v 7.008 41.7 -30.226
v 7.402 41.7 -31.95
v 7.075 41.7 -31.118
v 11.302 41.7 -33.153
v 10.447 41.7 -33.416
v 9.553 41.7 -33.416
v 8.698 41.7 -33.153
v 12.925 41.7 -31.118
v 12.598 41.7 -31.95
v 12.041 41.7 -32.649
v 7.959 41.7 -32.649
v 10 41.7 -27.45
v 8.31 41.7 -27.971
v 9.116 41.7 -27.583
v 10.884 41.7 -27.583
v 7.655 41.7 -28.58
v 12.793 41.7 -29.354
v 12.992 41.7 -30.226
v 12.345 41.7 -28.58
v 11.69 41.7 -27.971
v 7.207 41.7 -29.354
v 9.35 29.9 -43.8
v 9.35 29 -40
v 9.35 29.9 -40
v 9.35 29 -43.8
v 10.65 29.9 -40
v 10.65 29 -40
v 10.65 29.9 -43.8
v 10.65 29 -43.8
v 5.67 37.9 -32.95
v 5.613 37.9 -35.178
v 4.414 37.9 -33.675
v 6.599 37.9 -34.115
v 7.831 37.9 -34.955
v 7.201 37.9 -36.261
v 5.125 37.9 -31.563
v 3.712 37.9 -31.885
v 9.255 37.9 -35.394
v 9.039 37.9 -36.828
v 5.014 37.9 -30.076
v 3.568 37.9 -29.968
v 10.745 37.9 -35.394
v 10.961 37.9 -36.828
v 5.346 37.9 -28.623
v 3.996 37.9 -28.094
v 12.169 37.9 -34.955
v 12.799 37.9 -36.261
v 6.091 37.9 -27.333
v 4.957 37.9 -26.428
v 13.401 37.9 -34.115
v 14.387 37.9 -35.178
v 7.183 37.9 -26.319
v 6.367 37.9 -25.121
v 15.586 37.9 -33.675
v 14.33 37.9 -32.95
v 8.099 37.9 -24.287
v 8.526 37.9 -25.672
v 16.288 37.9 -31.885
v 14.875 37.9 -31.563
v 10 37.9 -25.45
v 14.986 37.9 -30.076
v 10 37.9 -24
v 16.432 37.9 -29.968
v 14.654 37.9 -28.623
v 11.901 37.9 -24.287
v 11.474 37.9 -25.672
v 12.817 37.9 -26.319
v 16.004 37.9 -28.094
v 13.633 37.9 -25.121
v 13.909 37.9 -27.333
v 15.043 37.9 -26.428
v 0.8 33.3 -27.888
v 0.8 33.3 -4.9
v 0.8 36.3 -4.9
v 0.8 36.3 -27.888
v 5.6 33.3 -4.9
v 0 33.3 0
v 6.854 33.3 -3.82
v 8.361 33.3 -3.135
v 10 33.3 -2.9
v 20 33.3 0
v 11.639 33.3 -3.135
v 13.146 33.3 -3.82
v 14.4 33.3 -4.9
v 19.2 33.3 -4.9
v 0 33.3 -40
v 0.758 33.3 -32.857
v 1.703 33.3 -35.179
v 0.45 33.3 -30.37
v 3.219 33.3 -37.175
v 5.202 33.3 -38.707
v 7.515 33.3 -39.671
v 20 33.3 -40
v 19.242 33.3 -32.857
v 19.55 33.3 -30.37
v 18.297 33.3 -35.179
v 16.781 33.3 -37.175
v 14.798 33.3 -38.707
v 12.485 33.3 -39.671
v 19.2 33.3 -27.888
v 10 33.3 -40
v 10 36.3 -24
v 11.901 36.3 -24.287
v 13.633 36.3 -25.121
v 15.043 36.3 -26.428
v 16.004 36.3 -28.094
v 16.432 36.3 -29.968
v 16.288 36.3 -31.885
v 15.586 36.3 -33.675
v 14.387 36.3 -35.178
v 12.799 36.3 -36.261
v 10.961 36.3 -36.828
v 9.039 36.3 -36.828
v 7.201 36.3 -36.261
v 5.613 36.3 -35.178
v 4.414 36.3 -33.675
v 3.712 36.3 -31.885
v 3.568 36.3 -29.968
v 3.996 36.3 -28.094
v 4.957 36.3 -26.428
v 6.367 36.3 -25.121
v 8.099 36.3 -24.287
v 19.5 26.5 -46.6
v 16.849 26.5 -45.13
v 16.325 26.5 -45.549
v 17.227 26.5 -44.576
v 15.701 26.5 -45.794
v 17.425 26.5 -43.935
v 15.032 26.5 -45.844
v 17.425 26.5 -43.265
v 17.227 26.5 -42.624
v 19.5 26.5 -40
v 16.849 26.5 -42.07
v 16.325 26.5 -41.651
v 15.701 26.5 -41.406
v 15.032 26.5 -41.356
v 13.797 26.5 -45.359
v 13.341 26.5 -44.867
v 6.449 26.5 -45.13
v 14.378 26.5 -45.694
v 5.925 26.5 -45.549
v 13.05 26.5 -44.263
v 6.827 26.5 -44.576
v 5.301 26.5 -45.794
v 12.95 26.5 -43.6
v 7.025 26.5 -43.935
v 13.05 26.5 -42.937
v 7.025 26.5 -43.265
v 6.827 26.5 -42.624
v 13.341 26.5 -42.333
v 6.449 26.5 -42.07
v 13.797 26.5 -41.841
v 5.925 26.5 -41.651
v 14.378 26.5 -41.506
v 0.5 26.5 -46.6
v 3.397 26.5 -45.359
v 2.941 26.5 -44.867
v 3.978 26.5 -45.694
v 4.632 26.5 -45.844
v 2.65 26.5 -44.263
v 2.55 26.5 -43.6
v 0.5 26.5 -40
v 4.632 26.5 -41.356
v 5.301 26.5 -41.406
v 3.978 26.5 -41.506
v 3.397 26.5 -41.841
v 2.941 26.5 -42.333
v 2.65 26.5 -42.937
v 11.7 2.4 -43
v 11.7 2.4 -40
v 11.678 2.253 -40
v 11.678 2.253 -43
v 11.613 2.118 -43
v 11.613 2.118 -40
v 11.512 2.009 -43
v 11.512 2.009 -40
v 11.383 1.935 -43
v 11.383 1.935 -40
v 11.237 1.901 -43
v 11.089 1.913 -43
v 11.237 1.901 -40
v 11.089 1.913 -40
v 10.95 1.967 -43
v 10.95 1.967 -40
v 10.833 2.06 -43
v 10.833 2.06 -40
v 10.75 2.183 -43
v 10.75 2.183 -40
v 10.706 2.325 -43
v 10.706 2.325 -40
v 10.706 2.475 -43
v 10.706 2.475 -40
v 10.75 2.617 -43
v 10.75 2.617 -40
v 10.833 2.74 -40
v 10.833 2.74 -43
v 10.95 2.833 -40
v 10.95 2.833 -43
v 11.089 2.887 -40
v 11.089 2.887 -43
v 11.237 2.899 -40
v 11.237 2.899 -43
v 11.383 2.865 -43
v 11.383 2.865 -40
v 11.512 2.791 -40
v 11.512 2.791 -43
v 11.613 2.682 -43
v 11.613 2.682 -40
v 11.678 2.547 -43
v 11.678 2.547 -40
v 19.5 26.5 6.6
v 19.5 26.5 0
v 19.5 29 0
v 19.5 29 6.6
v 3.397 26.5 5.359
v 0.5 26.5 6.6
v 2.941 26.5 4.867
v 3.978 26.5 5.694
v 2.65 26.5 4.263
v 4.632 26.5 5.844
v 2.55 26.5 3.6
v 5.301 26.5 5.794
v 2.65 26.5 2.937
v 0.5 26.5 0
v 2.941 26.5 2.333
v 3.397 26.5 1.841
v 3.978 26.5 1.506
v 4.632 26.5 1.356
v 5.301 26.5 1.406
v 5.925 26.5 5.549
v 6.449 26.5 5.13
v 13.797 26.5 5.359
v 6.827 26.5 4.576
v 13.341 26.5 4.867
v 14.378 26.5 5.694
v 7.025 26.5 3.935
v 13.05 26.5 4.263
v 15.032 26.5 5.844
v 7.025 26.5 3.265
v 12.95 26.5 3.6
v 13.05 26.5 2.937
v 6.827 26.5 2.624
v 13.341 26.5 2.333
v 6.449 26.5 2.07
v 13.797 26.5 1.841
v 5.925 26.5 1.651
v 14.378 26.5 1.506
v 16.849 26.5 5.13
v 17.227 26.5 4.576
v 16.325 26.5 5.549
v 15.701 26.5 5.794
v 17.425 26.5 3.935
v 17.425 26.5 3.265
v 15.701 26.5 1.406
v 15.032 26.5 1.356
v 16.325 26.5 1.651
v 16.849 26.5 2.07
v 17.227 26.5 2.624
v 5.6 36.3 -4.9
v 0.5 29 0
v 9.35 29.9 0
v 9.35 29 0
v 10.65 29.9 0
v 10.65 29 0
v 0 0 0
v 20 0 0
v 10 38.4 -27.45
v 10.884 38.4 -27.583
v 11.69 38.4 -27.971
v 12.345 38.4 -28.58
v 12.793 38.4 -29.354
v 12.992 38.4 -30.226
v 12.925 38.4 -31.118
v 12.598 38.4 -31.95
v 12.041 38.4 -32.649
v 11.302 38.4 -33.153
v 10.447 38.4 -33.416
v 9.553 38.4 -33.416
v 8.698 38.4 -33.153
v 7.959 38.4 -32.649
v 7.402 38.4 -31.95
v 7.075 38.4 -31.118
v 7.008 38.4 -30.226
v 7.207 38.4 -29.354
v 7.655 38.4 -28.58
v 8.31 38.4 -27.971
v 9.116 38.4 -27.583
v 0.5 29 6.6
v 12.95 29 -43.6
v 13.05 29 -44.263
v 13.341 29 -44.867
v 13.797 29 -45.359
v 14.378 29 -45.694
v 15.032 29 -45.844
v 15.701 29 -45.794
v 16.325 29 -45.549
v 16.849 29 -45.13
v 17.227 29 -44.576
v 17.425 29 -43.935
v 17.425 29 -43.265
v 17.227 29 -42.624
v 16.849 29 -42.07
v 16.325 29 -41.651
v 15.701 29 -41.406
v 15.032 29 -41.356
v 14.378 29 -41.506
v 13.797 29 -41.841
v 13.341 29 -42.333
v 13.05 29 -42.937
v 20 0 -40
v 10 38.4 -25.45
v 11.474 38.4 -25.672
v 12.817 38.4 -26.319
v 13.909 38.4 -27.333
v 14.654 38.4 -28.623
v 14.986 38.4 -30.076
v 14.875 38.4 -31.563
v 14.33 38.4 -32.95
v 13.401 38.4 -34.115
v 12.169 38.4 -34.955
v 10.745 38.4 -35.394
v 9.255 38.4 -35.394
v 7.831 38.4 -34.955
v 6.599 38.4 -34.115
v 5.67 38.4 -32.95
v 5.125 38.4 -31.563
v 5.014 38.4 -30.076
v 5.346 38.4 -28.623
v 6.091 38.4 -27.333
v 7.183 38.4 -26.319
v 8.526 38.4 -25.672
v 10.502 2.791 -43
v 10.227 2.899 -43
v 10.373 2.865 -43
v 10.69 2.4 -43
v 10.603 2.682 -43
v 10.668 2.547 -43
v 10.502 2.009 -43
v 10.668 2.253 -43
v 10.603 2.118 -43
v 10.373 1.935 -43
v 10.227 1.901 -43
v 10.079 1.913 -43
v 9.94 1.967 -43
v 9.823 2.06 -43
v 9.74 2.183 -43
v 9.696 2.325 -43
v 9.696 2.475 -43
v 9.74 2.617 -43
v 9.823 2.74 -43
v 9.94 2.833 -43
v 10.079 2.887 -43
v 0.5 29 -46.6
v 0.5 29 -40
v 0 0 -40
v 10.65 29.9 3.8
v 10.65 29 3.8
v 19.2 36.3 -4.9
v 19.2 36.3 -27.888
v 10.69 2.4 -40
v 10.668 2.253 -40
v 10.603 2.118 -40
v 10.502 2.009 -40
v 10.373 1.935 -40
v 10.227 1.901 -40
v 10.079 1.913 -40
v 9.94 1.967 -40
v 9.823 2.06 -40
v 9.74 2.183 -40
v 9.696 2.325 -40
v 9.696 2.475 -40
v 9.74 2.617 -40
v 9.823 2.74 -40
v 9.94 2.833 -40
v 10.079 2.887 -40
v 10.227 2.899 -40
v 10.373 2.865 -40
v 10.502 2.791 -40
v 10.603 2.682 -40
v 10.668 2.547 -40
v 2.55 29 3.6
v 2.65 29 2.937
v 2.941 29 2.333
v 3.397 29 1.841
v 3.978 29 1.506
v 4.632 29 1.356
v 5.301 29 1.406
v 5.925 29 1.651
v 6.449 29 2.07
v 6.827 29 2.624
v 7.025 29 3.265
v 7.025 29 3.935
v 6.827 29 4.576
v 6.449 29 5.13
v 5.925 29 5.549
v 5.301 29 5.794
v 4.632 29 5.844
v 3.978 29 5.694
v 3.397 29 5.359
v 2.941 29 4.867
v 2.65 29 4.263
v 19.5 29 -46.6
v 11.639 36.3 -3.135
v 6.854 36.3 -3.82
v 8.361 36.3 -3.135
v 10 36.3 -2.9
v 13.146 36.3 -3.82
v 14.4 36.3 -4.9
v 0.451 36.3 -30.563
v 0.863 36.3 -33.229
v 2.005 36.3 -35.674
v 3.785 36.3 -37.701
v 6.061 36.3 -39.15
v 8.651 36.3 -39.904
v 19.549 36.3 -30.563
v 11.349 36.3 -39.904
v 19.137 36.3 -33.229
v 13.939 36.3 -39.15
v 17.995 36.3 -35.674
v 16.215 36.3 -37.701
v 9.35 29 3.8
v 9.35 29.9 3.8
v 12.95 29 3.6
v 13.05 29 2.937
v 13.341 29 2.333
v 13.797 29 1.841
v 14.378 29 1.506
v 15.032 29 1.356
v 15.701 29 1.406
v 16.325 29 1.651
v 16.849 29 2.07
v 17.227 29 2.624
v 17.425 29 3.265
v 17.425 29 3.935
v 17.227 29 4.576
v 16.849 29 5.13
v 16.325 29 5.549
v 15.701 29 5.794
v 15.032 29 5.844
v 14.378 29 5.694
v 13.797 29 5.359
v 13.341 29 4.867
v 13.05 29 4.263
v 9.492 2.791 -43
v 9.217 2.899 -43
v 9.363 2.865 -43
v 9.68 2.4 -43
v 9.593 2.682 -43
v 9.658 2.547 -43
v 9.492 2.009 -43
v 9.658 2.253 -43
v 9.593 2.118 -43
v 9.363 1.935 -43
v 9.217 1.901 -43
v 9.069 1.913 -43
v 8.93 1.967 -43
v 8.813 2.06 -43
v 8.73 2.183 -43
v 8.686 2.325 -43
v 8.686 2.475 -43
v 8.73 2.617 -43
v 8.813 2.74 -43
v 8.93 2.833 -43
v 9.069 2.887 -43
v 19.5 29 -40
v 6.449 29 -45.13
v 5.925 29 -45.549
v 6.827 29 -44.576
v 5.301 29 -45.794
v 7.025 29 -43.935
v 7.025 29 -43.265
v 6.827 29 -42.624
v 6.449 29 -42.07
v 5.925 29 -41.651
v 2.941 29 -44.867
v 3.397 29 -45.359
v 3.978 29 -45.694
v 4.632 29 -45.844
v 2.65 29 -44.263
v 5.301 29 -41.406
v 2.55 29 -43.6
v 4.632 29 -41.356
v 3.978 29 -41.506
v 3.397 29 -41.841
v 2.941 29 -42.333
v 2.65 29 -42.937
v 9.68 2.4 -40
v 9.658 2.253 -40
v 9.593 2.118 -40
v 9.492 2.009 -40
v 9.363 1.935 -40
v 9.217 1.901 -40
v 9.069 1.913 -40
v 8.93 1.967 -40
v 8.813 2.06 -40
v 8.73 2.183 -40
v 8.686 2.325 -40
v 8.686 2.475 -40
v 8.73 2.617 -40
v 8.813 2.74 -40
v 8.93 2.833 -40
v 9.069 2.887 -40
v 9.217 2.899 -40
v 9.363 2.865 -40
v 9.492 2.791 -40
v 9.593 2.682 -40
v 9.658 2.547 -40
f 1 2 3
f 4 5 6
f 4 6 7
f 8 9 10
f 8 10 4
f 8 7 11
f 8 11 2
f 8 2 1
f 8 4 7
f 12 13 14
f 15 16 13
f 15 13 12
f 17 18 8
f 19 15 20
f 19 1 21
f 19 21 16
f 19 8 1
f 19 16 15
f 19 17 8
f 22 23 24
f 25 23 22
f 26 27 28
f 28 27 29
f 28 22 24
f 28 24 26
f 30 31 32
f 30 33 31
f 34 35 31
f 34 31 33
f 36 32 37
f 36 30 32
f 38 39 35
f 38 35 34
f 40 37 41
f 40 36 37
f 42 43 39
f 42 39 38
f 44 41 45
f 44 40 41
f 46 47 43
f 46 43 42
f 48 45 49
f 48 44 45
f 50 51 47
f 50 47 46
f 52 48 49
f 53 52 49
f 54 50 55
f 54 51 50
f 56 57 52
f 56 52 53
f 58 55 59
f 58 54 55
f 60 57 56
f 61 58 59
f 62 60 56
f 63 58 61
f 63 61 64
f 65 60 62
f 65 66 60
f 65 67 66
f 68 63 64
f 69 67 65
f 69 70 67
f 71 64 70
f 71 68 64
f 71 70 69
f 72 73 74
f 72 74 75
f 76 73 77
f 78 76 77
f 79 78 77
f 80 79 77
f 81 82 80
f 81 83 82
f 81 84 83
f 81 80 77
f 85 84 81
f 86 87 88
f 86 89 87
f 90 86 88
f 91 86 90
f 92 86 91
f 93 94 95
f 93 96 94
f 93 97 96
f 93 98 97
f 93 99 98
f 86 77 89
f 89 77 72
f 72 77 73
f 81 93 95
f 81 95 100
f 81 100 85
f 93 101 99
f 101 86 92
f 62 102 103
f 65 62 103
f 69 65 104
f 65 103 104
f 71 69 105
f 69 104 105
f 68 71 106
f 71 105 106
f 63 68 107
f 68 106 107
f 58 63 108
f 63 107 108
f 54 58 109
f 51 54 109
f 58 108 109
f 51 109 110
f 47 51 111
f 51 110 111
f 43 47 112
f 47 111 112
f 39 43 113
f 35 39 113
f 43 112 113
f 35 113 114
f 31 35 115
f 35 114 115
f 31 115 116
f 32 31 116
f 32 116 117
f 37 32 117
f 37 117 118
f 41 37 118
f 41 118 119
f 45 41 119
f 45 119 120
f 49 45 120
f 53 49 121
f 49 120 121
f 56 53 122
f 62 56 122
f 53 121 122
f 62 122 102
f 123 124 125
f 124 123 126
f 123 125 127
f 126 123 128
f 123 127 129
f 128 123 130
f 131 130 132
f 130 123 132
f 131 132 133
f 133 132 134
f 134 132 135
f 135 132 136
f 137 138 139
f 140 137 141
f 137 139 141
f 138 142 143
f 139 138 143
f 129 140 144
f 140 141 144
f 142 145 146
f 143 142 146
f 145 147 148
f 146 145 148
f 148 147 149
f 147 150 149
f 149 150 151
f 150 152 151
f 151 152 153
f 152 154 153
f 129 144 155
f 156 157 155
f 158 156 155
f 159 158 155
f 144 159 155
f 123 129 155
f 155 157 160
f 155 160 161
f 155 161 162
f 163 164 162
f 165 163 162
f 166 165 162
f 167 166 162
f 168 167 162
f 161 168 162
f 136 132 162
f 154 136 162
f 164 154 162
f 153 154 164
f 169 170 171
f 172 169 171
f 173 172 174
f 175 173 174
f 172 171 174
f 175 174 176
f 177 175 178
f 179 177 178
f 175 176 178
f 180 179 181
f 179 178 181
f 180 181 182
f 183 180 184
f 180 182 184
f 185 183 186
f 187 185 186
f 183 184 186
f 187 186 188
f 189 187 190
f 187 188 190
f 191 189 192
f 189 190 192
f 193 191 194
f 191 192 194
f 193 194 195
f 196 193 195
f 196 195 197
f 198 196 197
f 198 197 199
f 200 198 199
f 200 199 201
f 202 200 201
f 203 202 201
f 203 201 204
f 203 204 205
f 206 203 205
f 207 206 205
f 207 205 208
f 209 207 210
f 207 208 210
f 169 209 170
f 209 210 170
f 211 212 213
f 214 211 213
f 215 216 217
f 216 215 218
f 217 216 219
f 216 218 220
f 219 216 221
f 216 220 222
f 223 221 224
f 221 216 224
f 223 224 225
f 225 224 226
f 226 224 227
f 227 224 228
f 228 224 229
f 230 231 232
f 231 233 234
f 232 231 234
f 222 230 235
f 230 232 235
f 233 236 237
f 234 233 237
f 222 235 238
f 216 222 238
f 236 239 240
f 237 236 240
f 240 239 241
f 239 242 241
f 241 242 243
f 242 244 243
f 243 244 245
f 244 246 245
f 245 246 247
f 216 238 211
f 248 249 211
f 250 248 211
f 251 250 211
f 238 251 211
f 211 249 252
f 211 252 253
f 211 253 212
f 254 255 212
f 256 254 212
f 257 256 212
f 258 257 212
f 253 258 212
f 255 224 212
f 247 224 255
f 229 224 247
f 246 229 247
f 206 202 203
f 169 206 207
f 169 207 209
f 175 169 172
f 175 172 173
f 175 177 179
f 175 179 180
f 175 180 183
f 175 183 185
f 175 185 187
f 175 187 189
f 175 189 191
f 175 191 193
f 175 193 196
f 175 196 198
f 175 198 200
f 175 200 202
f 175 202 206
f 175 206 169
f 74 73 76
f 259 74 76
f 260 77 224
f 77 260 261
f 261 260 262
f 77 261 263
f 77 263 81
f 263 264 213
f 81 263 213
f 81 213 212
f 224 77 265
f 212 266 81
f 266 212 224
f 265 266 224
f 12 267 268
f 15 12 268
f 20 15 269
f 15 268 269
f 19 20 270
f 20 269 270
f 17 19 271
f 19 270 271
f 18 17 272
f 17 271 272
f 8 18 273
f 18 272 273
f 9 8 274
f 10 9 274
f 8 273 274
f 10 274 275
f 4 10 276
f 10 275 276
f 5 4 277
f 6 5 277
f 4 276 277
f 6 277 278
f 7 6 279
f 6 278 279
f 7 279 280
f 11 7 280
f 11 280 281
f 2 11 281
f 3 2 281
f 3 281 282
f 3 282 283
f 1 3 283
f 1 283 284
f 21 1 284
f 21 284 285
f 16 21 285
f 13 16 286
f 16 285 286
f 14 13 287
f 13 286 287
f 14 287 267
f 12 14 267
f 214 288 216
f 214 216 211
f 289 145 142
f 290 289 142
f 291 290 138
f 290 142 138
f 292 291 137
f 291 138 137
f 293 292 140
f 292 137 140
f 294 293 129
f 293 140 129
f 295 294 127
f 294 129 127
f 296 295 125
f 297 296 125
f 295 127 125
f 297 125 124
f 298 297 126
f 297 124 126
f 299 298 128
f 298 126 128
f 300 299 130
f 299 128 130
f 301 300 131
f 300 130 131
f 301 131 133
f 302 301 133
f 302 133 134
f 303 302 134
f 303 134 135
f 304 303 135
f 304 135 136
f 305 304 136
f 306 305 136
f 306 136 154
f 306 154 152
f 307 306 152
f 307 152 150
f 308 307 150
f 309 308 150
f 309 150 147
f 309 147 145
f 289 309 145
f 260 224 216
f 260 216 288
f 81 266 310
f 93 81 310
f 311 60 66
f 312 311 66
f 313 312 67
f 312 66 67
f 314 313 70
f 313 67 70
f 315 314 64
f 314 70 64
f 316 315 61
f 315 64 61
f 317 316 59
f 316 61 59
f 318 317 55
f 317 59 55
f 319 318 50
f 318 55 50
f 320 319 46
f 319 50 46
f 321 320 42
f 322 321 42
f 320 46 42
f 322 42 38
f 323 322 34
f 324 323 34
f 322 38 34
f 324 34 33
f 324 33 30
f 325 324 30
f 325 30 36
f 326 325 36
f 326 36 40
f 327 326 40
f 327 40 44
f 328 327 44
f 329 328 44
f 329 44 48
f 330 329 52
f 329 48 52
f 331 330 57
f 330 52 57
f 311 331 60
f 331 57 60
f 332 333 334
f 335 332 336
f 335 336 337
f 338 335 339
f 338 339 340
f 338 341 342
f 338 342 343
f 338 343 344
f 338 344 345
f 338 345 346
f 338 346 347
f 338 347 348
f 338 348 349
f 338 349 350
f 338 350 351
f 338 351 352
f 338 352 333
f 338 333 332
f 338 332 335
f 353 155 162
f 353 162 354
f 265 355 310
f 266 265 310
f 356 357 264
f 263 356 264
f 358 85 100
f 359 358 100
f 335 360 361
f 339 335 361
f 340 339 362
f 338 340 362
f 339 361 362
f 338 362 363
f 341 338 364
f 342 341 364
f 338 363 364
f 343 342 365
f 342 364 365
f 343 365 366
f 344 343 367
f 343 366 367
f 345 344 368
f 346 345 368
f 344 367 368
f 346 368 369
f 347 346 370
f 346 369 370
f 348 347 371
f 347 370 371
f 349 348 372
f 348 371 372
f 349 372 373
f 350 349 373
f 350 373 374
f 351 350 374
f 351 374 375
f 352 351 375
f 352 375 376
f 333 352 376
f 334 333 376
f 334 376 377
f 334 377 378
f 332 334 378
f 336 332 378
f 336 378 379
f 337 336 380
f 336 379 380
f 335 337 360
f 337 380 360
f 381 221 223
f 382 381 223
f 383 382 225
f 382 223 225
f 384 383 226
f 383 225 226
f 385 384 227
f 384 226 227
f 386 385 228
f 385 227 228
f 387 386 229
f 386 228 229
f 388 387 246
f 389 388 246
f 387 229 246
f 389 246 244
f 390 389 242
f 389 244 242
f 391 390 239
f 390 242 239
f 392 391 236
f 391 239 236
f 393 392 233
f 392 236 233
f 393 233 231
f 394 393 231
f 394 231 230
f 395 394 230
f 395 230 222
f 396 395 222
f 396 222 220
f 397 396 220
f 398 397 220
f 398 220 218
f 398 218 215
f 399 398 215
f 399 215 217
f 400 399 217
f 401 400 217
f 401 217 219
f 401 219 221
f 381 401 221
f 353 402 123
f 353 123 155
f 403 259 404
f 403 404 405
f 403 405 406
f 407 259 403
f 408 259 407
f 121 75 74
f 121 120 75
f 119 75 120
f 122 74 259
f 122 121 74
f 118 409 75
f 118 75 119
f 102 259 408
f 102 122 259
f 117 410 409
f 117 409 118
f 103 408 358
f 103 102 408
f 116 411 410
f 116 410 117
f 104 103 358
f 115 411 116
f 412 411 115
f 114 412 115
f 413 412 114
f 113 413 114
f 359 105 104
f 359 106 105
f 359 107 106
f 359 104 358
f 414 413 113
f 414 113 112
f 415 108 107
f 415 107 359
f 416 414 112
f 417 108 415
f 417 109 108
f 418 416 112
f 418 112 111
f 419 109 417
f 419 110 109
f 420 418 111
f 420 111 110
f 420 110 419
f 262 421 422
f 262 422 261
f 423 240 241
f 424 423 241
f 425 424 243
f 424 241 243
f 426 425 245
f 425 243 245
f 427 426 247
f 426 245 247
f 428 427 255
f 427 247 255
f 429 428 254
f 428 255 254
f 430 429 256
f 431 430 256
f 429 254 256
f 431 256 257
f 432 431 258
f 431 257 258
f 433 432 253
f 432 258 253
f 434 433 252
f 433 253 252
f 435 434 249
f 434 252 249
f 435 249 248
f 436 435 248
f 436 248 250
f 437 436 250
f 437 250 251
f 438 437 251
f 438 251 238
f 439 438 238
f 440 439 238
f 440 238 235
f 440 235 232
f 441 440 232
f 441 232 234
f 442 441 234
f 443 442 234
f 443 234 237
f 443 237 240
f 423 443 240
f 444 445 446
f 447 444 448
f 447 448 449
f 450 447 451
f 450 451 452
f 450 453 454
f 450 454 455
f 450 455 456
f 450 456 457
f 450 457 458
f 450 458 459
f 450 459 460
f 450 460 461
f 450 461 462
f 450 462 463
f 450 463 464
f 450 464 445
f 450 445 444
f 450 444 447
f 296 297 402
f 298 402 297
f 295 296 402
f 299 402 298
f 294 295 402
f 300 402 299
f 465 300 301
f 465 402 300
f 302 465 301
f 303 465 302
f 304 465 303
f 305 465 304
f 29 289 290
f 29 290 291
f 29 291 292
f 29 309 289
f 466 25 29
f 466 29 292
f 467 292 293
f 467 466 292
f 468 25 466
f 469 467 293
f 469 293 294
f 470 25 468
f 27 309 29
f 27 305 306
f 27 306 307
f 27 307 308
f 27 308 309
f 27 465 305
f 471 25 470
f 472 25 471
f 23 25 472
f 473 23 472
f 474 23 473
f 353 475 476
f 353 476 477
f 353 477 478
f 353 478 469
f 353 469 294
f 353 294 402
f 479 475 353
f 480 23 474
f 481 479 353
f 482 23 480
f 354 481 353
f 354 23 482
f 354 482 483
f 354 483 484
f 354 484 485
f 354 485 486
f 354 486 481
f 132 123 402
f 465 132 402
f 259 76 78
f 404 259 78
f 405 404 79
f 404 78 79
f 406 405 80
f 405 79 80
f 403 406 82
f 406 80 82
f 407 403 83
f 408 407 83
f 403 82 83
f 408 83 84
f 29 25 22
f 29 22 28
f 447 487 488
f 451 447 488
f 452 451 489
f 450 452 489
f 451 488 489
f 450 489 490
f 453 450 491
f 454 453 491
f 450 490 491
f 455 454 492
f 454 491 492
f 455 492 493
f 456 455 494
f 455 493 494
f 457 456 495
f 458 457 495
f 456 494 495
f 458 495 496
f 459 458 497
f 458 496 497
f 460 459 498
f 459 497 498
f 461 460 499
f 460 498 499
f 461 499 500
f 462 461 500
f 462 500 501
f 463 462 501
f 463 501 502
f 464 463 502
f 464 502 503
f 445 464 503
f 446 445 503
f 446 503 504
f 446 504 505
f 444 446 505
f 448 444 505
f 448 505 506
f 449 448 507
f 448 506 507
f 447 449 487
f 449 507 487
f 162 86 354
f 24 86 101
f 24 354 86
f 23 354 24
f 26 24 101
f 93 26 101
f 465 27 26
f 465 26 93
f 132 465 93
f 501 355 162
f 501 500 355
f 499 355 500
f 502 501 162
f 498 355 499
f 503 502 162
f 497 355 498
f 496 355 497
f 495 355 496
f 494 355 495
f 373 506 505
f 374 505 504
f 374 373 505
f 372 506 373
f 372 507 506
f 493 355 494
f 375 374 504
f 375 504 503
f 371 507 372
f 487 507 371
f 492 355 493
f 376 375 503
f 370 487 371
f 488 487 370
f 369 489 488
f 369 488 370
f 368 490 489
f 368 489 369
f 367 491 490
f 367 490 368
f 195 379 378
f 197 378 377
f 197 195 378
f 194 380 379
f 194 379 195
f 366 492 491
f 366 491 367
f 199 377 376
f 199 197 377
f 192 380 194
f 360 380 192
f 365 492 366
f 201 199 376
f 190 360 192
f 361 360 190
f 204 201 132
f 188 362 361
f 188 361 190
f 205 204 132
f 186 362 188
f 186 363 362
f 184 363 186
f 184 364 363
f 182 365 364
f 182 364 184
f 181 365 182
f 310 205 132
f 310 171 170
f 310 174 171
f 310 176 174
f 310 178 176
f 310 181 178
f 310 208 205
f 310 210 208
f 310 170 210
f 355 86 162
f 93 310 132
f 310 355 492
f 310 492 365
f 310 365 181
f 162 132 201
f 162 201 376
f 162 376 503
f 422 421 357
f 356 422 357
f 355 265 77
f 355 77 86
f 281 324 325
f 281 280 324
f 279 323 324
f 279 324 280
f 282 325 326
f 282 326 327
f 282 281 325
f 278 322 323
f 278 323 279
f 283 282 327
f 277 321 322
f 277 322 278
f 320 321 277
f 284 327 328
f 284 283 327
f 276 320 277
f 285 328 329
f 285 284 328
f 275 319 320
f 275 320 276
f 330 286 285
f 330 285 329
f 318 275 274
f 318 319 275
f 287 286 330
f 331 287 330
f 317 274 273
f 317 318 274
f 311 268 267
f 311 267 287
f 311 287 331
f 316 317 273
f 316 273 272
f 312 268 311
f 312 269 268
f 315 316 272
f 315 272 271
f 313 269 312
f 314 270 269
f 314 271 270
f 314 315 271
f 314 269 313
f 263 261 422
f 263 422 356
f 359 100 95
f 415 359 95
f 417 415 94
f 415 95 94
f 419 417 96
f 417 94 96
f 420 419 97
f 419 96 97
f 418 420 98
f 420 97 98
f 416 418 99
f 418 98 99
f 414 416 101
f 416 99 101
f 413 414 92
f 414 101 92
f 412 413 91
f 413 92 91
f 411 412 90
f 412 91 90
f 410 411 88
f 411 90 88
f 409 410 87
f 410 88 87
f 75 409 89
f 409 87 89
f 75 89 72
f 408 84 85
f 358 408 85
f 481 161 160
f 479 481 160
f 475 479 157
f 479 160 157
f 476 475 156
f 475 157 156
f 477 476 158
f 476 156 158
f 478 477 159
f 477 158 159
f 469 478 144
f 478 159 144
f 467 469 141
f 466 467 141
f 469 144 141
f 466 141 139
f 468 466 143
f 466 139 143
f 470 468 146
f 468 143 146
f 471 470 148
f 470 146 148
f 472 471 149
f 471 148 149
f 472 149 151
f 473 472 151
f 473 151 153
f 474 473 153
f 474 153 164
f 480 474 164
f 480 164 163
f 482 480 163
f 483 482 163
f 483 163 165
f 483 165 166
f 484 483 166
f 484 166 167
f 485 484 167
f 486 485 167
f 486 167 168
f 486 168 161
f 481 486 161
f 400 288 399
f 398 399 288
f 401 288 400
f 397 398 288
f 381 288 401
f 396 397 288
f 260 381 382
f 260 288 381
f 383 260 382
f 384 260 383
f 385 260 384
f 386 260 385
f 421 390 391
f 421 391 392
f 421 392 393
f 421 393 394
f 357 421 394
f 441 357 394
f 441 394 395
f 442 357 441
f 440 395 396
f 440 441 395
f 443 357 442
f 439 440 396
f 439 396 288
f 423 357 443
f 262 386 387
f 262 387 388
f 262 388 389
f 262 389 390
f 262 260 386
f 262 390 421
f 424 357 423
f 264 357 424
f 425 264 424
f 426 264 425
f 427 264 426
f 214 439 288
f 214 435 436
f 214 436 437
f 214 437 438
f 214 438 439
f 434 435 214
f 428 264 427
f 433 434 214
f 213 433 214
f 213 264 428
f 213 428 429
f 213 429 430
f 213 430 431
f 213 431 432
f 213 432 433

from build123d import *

# Parameters (mm, degrees)
SKETCH1_W                = 20
SKETCH1_H                = 40
BOSS_EXTRUDE1_DEPTH      = 33.3
SKETCH2_W                = 19
SKETCH2_H                = 2.5
BOSS_EXTRUDE2_DEPTH      = 6.6
SKETCH3_W                = 19
SKETCH3_H                = 2.5
BOSS_EXTRUDE3_DEPTH      = 6.6
SKETCH4_R                = 9.55
BOSS_EXTRUDE4_DEPTH      = 3
SKETCH12_W               = 18.4
SKETCH12_H               = 26
BOSS_EXTRUDE10_DEPTH     = 3
SKETCH11_R               = 0.5
BOSS_EXTRUDE9_DEPTH      = 3
LPATTERN2_COUNT          = 3
LPATTERN2_PITCH          = 1.01
SKETCH13_R               = 6.45
BOSS_EXTRUDE11_DEPTH     = 1.6
SKETCH14_R               = 5
BOSS_EXTRUDE12_DEPTH     = 0.5
SKETCH15_R               = 3
BOSS_EXTRUDE13_DEPTH     = 3.3
BOSS_EXTRUDE14_DEPTH     = 3
SKETCH17_W               = 1.3
SKETCH17_H               = 3.8
BOSS_EXTRUDE15_DEPTH     = 0.9
SKETCH18_W               = 1.3
SKETCH18_H               = 3.8
BOSS_EXTRUDE16_DEPTH     = 0.9
M4_CLEARANCE_HOLE1_D     = 4.5
M4_CLEARANCE_HOLE1_DEPTH = 3
M4_CLEARANCE_HOLE1_TIP   = 1.351936393


with BuildPart() as part:
    # Sketch1 → Boss-Extrude1 (new body)
    with BuildSketch(Plane(origin=(0, 0, 0), x_dir=(1, 0, 0), z_dir=(0, 1, 0))):
        with Locations((10, 20)):
            Rectangle(SKETCH1_W, SKETCH1_H)
    extrude(amount=BOSS_EXTRUDE1_DEPTH)

    # Sketch2 → Boss-Extrude2 (add)
    with BuildSketch(Plane.XY):
        with Locations((10, 27.75)):
            Rectangle(SKETCH2_W, SKETCH2_H)
    extrude(amount=BOSS_EXTRUDE2_DEPTH)

    # Sketch3 → Boss-Extrude3 (add)
    with BuildSketch(Plane(origin=(0, 0, -40), x_dir=(-1, 0, 0), z_dir=(0, 0, -1))):
        with Locations((-10, 27.75)):
            Rectangle(SKETCH3_W, SKETCH3_H)
    extrude(amount=BOSS_EXTRUDE3_DEPTH)

    # Sketch4 → Boss-Extrude4 (add)
    with BuildSketch(Plane(origin=(0, 33.3, 0), x_dir=(1, 0, 0), z_dir=(0, 1, 0))):
        with Locations(Location((10, 30.45, 0), (0, 0, 90))):
            Circle(SKETCH4_R)
    extrude(amount=BOSS_EXTRUDE4_DEPTH)

    # Sketch12 → Boss-Extrude10 (add)
    with BuildSketch(Plane(origin=(0, 33.3, 0), x_dir=(1, 0, 0), z_dir=(0, 1, 0))):
        with Locations((10, 17.9)):
            Rectangle(SKETCH12_W, SKETCH12_H)
    extrude(amount=BOSS_EXTRUDE10_DEPTH)

    # Sketch11 → Boss-Extrude9 (add)
    with BuildSketch(Plane(origin=(0, 0, -40), x_dir=(-1, 0, 0), z_dir=(0, 0, -1))):
        with Locations(Location((-11.2, 2.4, 0), (0, 0, 180))):
            Circle(SKETCH11_R)
    boss_extrude9 = extrude(amount=BOSS_EXTRUDE9_DEPTH)

    # LPattern2: Boss-Extrude9 ×3
    with Locations(*[(-i * LPATTERN2_PITCH, 0, 0) for i in range(1, LPATTERN2_COUNT)]):
        add(boss_extrude9)

    # Sketch13 → Boss-Extrude11 (add)
    with BuildSketch(Plane(origin=(0, 36.3, 0), x_dir=(1, 0, 0), z_dir=(0, 1, 0))):
        with Locations(Location((10, 30.45, 0), (0, 0, 270))):
            Circle(SKETCH13_R)
    extrude(amount=BOSS_EXTRUDE11_DEPTH)

    # Sketch14 → Boss-Extrude12 (add)
    with BuildSketch(Plane(origin=(0, 37.9, 0), x_dir=(1, 0, 0), z_dir=(0, 1, 0))):
        with Locations(Location((10, 30.45, 0), (0, 0, 270))):
            Circle(SKETCH14_R)
    extrude(amount=BOSS_EXTRUDE12_DEPTH)

    # Sketch15 → Boss-Extrude13 (add)
    with BuildSketch(Plane(origin=(0, 38.4, 0), x_dir=(1, 0, 0), z_dir=(0, 1, 0))):
        with Locations(Location((10, 30.45, 0), (0, 0, 270))):
            Circle(SKETCH15_R)
    extrude(amount=BOSS_EXTRUDE13_DEPTH)

    # Sketch16 → Boss-Extrude14 (add)
    with BuildSketch(Plane(origin=(0, 33.3, 0), x_dir=(1, 0, 0), z_dir=(0, 1, 0))):
        with BuildLine():
            Line((14.4, 4.9), (5.6, 4.9))
            ThreePointArc((5.6, 4.9), (10, 2.9), (14.4, 4.9))
        make_face()
    extrude(amount=BOSS_EXTRUDE14_DEPTH)

    # Sketch17 → Boss-Extrude15 (add)
    with BuildSketch(Plane(origin=(0, 29, 0), x_dir=(1, 0, 0), z_dir=(0, 1, 0))):
        with Locations((10, -1.9)):
            Rectangle(SKETCH17_W, SKETCH17_H)
    extrude(amount=BOSS_EXTRUDE15_DEPTH)

    # Sketch18 → Boss-Extrude16 (add)
    with BuildSketch(Plane(origin=(0, 29, 0), x_dir=(1, 0, 0), z_dir=(0, 1, 0))):
        with Locations((10, 41.9)):
            Rectangle(SKETCH18_W, SKETCH18_H)
    extrude(amount=BOSS_EXTRUDE16_DEPTH)

    # M4 Clearance Hole1
    with Locations(Plane(origin=(0, 29, 0), x_dir=(1, 0, 0), z_dir=(0, 1, 0))):
        with Locations((4.8, 43.6), (15.2, 43.6), (4.8, -3.6), (15.2, -3.6)):
            Hole(M4_CLEARANCE_HOLE1_D / 2, depth=M4_CLEARANCE_HOLE1_DEPTH)
            with Locations((0, 0, -(M4_CLEARANCE_HOLE1_DEPTH + M4_CLEARANCE_HOLE1_TIP / 2))):  # 118° drill point
                Cone(0, M4_CLEARANCE_HOLE1_D / 2, M4_CLEARANCE_HOLE1_TIP, mode=Mode.SUBTRACT)


solid = part.part
